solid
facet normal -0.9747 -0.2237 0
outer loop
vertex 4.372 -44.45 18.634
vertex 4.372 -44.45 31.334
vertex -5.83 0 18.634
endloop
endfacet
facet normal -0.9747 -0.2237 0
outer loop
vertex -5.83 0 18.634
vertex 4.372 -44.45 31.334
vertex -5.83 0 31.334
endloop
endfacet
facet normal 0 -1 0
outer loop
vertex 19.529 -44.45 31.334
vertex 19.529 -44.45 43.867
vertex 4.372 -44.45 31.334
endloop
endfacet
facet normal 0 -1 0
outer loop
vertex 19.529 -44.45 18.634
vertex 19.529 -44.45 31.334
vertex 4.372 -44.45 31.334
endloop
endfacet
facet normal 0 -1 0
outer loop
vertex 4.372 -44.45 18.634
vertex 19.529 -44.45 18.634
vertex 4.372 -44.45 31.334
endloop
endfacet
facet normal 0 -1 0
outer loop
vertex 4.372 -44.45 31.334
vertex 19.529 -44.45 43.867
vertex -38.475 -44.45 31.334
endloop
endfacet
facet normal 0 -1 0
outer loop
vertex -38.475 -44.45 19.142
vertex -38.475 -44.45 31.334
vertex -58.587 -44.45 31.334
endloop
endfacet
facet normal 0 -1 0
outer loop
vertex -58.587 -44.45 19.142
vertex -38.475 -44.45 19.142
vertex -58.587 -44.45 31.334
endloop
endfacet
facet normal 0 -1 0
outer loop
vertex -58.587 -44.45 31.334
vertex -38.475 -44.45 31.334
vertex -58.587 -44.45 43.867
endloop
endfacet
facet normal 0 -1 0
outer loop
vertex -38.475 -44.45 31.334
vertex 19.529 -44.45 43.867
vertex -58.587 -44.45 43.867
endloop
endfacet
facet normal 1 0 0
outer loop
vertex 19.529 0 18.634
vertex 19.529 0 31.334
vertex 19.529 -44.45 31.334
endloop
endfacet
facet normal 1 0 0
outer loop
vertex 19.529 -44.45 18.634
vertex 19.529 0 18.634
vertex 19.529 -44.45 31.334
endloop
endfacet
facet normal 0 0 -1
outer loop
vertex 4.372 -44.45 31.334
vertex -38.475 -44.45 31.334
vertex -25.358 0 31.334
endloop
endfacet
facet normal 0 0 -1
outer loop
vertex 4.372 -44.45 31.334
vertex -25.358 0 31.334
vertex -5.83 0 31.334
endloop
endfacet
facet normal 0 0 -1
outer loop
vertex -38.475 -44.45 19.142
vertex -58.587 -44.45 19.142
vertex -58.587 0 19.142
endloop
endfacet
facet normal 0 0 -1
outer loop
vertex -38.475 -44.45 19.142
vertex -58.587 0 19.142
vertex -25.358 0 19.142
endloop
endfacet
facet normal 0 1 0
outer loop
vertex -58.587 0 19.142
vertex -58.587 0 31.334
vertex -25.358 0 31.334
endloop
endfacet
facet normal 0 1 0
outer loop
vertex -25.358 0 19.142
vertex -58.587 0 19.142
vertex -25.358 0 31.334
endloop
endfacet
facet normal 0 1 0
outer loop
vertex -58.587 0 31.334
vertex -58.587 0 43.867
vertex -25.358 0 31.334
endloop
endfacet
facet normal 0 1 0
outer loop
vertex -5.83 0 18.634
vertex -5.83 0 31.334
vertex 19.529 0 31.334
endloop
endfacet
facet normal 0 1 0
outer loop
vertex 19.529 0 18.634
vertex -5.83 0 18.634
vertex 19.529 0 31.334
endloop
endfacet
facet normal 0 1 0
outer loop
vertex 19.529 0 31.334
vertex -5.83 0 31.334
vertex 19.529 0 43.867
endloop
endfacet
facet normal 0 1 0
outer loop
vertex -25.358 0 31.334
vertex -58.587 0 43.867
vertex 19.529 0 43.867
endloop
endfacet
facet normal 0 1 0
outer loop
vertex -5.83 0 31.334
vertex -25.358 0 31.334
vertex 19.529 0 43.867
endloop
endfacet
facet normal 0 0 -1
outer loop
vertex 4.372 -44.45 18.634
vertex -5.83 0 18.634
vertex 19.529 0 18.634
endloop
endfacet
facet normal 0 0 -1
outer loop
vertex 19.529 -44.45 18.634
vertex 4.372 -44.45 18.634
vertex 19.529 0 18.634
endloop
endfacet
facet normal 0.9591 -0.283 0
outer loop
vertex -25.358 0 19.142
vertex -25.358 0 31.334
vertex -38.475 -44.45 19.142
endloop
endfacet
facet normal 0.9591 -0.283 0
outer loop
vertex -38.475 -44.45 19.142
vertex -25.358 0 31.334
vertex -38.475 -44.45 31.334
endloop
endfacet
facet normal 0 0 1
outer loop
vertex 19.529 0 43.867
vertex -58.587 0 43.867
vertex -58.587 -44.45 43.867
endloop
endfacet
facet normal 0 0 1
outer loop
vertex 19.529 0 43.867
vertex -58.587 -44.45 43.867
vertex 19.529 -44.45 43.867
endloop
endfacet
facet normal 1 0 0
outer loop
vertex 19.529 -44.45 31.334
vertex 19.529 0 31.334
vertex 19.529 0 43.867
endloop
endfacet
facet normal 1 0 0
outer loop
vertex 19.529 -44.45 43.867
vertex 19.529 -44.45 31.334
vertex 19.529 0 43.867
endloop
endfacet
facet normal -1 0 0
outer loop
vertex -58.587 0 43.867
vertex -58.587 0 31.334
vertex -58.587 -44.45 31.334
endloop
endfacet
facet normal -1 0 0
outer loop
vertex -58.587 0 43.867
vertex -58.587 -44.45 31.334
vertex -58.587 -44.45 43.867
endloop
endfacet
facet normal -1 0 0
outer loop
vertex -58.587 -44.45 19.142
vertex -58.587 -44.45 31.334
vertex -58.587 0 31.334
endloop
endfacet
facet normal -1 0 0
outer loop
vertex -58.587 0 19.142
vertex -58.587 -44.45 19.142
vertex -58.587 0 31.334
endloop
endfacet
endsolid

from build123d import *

# Parameters (mm, degrees)
F0_W     = 78.115409
F0_H     = 12.533441
F1_DEPTH = 44.45
F3_DEPTH = 12.192
F5_DEPTH = 12.7


with BuildPart() as f1:
    # F0 (on Front) → F1 (new body)
    with BuildSketch(Plane.XZ):
        with Locations((-19.528851, 37.600327)):
            Rectangle(F0_W, F0_H)
    extrude(amount=F1_DEPTH)

    # F2 (on face) → F3 (join)
    with BuildSketch(Plane(origin=(0, 0, 31.333607), x_dir=(1, 0, 0), z_dir=(0, 0, -1))):
        Polygon((-25.35836, 0), (-38.474753, 44.45), (-58.586556, 44.45), (-58.586556, 0), align=None)
    extrude(amount=F3_DEPTH)

    # F4 (on face) → F5 (join)
    with BuildSketch(Plane(origin=(0, 0, 31.333607), x_dir=(1, 0, 0), z_dir=(0, 0, -1))):
        Polygon((4.372132, 44.45), (-5.829508, 0), (19.528853, 0), (19.528853, 44.45), align=None)
    extrude(amount=F5_DEPTH)


solid = f1.part
